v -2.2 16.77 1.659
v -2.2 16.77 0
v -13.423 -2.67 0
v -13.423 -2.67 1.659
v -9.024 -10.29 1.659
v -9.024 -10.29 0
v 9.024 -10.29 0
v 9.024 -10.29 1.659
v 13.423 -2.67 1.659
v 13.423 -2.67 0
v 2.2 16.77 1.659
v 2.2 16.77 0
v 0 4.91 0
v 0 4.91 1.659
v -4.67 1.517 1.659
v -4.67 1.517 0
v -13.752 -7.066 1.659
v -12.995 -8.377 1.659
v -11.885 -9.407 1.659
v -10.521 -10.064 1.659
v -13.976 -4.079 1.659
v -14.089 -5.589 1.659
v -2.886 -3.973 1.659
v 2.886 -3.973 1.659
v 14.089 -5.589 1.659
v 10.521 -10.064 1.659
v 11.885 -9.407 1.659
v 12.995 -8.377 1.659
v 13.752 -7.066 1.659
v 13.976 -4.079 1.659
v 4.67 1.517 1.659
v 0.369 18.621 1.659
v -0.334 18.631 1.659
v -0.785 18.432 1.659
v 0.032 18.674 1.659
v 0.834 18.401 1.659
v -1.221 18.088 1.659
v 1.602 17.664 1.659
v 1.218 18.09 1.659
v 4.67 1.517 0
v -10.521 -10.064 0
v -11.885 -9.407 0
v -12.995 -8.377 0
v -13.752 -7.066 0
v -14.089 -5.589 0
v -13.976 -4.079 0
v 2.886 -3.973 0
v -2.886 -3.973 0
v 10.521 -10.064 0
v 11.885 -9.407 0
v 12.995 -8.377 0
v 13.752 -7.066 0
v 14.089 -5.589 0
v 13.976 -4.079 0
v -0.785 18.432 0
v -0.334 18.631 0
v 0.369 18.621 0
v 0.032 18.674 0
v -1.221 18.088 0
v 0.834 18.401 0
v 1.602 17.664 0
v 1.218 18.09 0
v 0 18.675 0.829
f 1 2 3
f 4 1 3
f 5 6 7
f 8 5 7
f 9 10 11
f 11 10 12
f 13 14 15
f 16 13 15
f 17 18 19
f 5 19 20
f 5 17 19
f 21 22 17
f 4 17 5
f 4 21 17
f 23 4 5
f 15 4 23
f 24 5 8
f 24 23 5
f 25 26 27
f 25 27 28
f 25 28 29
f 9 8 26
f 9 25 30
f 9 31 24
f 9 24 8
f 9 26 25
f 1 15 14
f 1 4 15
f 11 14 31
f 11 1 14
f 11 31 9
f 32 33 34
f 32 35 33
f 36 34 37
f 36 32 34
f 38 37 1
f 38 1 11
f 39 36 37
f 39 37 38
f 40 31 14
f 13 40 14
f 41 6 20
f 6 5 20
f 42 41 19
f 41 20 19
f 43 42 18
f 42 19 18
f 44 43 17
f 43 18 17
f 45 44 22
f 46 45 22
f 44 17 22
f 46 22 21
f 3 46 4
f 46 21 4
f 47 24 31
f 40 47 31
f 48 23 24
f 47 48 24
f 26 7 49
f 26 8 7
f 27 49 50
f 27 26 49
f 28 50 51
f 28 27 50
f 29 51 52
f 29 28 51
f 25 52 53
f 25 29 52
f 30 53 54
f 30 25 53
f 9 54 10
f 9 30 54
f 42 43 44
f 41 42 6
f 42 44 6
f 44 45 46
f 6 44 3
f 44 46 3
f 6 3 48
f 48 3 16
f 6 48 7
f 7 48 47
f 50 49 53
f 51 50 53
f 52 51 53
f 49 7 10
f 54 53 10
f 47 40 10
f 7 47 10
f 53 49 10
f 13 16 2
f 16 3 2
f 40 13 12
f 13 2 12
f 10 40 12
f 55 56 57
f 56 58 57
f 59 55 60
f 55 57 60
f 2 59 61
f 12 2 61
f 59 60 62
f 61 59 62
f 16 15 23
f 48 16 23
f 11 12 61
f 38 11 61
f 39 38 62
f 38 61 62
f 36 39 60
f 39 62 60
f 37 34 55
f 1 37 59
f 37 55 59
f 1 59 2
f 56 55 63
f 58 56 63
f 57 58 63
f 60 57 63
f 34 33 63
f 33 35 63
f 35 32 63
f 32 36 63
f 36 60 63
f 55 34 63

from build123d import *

# Parameters (mm, degrees)
F1_DEPTH    = 1.65862
F2_T1_DEPTH = 23.6556652561
F3_R        = 5.08
F4_R        = 5.08
F6_DEPTH    = 25.4


# Not quite as in the source:
# - a fillet or chamfer that OpenCascade refuses, or shapes differently, is made with other operations: its cross-section is extruded or revolved along the edge and cut away or added


with BuildPart() as f1:
    # F0 (on Top) → F1 (new body)
    with BuildSketch(Plane.XY):
        Polygon((17.8223861725, -10.2897594543), (0, 20.5795189086), (-17.8223861725, -10.2897594543), align=None)
    extrude(amount=F1_DEPTH)

    # F2: fillet of radius 2.54 on 1 edges, made by hand

    # F2_s2 → F2_t1 (cut)
    with BuildSketch(Plane.XY.offset(-10.9985226281)):
        with BuildLine():
            add(Edge.make_bspline(
                [(2.1997045256, 16.7695189086), (0, 20.5795189086), (-2.1997045256, 16.7695189086)],
                knots=[0, 0, 0, 1, 1, 1], degree=2, weights=[1, 1, 1]))
            Line((-2.1997045256, 16.7695189086), (0, 20.5795189086))
            Line((0, 20.5795189086), (2.1997045256, 16.7695189086))
        make_face()
    extrude(amount=F2_T1_DEPTH, mode=Mode.SUBTRACT)

    # F3
    f3_edges = [f1.edges().sort_by_distance(p)[0] for p in [
        (-17.822386, -10.289759, 0.82931),
    ]]
    fillet(f3_edges, radius=F3_R)

    # F4
    f4_edges = [f1.edges().sort_by_distance(p)[0] for p in [
        (17.822386, -10.289759, 0.82931),
    ]]
    fillet(f4_edges, radius=F4_R)

    # F5 (on face) → F6 (cut)
    with BuildSketch(Plane.XY.offset(1.65862)):
        Polygon((4.6700308471, 1.5173850042), (0, 4.9103610218), (-4.6700308471, 1.5173850042), (-2.886237792, -3.9725655151), (2.886237792, -3.9725655151), align=None)
    extrude(amount=-F6_DEPTH, mode=Mode.SUBTRACT)


solid = f1.part
